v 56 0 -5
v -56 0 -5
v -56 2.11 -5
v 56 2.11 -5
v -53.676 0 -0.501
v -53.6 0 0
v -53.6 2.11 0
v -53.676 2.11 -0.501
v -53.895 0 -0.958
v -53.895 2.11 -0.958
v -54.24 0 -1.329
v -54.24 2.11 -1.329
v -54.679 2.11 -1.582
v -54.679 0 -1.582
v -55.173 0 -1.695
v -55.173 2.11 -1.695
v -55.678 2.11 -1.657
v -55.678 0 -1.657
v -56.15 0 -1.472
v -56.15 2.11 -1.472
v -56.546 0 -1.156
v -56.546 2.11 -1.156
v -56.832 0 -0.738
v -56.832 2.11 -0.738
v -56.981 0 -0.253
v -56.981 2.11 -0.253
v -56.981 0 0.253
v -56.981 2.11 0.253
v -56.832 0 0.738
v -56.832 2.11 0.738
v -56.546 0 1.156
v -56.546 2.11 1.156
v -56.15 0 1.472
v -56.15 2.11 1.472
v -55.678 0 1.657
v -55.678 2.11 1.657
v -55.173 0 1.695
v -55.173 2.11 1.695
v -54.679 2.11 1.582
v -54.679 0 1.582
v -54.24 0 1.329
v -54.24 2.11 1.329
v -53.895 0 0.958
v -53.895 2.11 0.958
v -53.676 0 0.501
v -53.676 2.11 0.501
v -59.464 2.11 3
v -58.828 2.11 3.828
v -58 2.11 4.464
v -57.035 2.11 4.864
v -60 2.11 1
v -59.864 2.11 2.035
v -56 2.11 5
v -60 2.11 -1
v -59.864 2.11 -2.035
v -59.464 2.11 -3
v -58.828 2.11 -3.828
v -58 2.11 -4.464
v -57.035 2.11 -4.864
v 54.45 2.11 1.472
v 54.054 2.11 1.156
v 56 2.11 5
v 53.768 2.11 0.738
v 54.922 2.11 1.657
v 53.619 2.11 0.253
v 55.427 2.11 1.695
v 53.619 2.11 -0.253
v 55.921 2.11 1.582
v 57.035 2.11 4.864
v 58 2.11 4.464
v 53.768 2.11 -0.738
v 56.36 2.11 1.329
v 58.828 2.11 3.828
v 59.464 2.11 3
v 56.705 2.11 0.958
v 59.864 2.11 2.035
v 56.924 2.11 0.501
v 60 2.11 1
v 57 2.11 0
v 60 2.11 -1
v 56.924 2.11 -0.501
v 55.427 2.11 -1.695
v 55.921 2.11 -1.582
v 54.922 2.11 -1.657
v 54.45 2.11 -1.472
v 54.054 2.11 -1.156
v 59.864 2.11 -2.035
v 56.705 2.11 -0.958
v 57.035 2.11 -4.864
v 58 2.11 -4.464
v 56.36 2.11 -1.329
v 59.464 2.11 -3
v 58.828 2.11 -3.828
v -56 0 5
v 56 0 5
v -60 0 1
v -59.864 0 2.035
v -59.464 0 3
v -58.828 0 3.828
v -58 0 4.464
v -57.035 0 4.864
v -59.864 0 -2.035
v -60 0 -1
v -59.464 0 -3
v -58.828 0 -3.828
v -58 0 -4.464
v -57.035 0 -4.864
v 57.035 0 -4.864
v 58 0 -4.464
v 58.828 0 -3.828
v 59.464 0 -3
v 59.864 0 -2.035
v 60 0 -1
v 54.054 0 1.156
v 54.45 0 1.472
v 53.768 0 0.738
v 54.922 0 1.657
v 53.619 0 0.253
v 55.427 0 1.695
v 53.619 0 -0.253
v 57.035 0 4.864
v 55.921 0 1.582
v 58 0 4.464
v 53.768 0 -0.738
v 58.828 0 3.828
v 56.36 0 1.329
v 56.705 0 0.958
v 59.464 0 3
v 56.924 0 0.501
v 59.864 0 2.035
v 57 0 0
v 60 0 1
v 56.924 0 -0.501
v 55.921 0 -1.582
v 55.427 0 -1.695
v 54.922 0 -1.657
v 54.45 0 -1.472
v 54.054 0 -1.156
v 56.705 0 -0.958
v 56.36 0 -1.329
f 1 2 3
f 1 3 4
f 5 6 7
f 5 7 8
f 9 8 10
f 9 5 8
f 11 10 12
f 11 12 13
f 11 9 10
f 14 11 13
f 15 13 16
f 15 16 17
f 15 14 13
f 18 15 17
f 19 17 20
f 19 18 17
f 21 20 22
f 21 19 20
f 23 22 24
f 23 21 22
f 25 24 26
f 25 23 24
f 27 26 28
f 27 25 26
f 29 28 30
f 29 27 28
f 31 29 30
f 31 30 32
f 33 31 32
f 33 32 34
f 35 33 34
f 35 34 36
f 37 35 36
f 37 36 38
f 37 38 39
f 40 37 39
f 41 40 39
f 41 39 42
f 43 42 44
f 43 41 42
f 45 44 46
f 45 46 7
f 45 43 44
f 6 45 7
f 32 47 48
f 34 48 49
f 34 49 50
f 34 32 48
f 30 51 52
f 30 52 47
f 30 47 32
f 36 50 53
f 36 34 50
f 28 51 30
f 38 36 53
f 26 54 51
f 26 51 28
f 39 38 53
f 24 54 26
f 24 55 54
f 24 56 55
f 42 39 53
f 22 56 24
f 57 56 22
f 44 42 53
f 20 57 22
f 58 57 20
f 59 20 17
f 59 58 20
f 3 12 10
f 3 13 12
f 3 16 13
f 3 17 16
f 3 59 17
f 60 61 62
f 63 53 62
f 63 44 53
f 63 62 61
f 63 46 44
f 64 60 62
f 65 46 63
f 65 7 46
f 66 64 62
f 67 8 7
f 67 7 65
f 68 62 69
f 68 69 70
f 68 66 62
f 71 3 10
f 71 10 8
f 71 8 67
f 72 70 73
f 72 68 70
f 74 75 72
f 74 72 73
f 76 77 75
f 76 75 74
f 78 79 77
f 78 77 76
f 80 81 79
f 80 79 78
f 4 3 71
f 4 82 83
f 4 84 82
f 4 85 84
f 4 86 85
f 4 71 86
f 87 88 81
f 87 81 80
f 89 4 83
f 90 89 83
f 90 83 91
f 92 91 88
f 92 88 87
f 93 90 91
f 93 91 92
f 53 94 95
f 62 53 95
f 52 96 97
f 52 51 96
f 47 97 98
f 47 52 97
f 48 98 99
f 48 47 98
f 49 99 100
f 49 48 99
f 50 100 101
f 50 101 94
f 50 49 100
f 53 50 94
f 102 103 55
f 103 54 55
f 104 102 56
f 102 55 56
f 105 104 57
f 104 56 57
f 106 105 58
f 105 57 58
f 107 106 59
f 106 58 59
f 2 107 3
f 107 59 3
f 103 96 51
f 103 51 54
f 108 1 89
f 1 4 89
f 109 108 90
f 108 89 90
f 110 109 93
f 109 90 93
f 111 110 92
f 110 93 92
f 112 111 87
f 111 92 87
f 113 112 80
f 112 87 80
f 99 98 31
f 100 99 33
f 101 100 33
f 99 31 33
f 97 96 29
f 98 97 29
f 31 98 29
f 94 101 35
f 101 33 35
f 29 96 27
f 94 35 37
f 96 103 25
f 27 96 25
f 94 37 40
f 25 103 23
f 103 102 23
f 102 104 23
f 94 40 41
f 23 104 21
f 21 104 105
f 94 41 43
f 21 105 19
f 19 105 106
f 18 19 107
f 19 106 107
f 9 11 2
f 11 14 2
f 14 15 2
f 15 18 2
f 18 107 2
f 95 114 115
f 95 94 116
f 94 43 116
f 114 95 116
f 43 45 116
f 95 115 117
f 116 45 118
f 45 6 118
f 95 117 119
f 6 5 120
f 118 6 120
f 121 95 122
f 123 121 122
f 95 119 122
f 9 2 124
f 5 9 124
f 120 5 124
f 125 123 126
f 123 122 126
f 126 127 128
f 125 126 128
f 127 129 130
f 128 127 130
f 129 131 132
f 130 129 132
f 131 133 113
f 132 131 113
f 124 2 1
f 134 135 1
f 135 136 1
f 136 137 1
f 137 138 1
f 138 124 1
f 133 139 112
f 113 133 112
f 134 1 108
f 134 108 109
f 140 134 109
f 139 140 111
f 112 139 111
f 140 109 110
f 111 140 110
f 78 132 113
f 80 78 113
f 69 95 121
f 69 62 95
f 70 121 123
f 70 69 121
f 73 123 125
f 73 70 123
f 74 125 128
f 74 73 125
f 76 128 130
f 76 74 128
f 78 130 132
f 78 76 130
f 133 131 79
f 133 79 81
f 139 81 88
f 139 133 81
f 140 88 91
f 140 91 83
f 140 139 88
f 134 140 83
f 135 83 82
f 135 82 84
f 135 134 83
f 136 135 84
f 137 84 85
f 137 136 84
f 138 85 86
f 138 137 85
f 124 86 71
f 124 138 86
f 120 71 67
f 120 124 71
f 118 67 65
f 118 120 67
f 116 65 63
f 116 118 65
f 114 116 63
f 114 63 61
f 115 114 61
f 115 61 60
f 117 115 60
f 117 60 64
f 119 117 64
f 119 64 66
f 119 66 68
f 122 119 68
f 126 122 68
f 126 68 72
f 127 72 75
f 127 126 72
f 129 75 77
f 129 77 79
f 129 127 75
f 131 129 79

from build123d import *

# Parameters (mm, degrees)
CROQUIS1_W              = 120
CROQUIS1_H              = 10
CROQUIS1_R              = 1.7
SALIENTE_EXTRUIR1_DEPTH = 2.11
REDONDEO1_R             = 4


with BuildPart() as part:
    # Croquis1 → Saliente-Extruir1 (new body)
    with BuildSketch(Plane(origin=(0, 0, 0), x_dir=(1, 0, 0), z_dir=(0, 1, 0))):
        Rectangle(CROQUIS1_W, CROQUIS1_H)
        with Locations((-55.3, 0)):
            Circle(CROQUIS1_R, mode=Mode.SUBTRACT)
        with Locations((55.3, 0)):
            Circle(CROQUIS1_R, mode=Mode.SUBTRACT)
    extrude(amount=SALIENTE_EXTRUIR1_DEPTH)

    # Redondeo1
    redondeo1_edges = [part.edges().sort_by_distance(p)[0] for p in [
        (60, 1.055, 5),
        (-60, 1.055, 5),
        (-60, 1.055, -5),
        (60, 1.055, -5),
    ]]
    fillet(redondeo1_edges, radius=REDONDEO1_R)


solid = part.part
